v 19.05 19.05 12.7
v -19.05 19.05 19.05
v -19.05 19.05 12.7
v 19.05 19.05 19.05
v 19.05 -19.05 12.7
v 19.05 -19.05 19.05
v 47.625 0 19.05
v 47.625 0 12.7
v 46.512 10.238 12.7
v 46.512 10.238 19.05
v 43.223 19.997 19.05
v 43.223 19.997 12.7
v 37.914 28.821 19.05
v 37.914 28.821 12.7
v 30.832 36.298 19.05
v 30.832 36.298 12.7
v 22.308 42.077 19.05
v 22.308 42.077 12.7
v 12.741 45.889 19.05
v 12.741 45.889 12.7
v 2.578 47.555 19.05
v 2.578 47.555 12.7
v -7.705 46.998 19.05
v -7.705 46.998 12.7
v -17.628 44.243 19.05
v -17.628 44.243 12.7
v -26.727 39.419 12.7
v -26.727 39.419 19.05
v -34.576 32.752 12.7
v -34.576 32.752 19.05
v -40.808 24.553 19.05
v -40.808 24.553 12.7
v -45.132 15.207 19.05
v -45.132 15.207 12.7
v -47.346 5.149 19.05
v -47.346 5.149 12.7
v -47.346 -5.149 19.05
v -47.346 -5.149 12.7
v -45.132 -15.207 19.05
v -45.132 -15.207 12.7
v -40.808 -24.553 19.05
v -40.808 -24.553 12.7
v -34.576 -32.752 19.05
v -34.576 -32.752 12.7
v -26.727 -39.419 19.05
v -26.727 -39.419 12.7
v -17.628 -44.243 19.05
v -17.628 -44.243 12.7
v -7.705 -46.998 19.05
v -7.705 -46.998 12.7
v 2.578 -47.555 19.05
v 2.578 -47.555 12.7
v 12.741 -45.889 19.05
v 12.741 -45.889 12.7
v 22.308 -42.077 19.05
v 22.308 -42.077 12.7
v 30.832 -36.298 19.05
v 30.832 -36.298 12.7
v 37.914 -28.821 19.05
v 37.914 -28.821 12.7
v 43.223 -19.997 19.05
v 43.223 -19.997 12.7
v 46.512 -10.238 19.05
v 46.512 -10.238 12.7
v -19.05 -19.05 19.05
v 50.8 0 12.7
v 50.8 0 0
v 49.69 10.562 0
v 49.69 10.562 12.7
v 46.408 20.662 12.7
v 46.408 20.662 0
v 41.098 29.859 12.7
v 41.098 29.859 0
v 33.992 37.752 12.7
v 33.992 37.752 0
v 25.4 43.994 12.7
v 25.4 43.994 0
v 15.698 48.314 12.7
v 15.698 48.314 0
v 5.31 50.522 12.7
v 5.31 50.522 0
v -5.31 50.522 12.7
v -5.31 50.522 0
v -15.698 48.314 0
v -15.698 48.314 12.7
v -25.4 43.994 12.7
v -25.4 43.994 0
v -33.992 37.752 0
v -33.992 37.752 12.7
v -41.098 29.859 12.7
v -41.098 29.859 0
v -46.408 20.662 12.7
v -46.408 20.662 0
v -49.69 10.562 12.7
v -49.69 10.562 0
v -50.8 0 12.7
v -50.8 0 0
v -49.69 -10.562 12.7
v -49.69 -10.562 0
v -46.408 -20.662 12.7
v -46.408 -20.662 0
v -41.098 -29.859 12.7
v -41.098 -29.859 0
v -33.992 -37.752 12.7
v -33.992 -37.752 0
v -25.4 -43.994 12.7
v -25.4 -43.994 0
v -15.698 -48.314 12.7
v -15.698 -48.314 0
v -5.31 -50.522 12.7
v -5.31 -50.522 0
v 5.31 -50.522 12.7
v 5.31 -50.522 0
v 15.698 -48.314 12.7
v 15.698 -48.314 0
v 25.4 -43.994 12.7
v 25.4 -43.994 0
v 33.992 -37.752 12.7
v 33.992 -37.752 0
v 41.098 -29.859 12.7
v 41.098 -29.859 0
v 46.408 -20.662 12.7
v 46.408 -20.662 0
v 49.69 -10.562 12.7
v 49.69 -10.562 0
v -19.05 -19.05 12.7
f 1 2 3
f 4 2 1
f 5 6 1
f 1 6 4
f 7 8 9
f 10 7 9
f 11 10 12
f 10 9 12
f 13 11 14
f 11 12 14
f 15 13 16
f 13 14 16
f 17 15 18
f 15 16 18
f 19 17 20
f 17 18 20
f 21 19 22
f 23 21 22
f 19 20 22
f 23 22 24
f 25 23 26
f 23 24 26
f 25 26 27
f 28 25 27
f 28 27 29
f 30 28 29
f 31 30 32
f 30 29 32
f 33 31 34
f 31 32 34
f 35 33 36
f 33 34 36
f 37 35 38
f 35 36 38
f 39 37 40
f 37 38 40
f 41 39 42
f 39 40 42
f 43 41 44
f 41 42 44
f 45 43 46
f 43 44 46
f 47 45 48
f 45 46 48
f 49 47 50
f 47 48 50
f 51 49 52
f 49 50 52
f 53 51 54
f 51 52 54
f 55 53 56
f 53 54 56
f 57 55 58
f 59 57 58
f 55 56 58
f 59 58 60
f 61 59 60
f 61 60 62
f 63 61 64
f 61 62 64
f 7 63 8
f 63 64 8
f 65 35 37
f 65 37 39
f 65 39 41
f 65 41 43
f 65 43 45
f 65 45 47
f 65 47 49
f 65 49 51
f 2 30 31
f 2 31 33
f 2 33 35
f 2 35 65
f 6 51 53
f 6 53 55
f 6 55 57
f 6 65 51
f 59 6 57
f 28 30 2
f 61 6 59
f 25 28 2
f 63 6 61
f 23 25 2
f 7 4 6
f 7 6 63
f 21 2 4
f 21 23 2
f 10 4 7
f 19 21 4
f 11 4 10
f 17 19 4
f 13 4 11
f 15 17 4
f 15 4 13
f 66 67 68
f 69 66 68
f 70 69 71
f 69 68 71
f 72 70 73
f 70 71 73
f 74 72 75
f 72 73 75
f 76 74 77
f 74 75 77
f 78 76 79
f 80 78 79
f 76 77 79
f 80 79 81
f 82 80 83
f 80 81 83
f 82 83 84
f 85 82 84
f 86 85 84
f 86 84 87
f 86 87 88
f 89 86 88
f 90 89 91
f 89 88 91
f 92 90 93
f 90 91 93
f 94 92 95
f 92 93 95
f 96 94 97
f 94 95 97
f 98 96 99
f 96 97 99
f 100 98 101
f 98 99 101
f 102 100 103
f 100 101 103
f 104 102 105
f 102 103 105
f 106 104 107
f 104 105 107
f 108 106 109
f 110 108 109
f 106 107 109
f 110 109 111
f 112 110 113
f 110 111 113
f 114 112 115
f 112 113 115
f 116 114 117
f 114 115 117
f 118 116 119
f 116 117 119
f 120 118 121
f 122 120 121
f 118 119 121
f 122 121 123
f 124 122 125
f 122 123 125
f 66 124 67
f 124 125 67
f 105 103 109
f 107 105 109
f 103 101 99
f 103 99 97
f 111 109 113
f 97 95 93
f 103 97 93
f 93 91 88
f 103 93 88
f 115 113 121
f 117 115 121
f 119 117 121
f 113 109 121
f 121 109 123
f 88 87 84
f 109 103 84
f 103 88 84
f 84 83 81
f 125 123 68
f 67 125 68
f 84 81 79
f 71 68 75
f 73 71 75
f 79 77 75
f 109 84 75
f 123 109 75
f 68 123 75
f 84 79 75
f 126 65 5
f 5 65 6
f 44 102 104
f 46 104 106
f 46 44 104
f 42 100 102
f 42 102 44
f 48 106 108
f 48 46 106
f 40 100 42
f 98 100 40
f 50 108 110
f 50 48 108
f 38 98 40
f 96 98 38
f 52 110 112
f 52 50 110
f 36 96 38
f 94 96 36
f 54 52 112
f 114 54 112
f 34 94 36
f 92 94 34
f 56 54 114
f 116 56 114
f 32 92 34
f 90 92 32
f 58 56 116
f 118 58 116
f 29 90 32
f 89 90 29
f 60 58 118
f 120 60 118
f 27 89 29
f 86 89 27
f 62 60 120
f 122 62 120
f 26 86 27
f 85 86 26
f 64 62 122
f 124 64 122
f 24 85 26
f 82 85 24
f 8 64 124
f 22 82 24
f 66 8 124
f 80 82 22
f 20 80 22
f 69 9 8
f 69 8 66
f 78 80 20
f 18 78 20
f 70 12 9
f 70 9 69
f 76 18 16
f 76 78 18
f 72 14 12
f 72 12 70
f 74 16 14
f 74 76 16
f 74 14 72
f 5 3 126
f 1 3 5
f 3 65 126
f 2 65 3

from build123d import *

# Parameters (mm, degrees)
F0_R     = 50.8
F1_DEPTH = 12.7
F2_R     = 47.625
F3_DEPTH = 6.35
F4_W     = 38.1
F4_H     = 38.1
F5_DEPTH = 6.35


with BuildPart() as f1:
    # F0 (on Top) → F1 (new body)
    with BuildSketch(Plane.XY):
        Circle(F0_R)
    extrude(amount=F1_DEPTH)

    # F2 (on face) → F3 (join)
    with BuildSketch(Plane.XY.offset(12.7)):
        Circle(F2_R)
    extrude(amount=F3_DEPTH)

    # F4 (on face) → F5 (cut)
    with BuildSketch(Plane.XY.offset(19.05)):
        Rectangle(F4_W, F4_H)
    extrude(amount=-F5_DEPTH, mode=Mode.SUBTRACT)


solid = f1.part
